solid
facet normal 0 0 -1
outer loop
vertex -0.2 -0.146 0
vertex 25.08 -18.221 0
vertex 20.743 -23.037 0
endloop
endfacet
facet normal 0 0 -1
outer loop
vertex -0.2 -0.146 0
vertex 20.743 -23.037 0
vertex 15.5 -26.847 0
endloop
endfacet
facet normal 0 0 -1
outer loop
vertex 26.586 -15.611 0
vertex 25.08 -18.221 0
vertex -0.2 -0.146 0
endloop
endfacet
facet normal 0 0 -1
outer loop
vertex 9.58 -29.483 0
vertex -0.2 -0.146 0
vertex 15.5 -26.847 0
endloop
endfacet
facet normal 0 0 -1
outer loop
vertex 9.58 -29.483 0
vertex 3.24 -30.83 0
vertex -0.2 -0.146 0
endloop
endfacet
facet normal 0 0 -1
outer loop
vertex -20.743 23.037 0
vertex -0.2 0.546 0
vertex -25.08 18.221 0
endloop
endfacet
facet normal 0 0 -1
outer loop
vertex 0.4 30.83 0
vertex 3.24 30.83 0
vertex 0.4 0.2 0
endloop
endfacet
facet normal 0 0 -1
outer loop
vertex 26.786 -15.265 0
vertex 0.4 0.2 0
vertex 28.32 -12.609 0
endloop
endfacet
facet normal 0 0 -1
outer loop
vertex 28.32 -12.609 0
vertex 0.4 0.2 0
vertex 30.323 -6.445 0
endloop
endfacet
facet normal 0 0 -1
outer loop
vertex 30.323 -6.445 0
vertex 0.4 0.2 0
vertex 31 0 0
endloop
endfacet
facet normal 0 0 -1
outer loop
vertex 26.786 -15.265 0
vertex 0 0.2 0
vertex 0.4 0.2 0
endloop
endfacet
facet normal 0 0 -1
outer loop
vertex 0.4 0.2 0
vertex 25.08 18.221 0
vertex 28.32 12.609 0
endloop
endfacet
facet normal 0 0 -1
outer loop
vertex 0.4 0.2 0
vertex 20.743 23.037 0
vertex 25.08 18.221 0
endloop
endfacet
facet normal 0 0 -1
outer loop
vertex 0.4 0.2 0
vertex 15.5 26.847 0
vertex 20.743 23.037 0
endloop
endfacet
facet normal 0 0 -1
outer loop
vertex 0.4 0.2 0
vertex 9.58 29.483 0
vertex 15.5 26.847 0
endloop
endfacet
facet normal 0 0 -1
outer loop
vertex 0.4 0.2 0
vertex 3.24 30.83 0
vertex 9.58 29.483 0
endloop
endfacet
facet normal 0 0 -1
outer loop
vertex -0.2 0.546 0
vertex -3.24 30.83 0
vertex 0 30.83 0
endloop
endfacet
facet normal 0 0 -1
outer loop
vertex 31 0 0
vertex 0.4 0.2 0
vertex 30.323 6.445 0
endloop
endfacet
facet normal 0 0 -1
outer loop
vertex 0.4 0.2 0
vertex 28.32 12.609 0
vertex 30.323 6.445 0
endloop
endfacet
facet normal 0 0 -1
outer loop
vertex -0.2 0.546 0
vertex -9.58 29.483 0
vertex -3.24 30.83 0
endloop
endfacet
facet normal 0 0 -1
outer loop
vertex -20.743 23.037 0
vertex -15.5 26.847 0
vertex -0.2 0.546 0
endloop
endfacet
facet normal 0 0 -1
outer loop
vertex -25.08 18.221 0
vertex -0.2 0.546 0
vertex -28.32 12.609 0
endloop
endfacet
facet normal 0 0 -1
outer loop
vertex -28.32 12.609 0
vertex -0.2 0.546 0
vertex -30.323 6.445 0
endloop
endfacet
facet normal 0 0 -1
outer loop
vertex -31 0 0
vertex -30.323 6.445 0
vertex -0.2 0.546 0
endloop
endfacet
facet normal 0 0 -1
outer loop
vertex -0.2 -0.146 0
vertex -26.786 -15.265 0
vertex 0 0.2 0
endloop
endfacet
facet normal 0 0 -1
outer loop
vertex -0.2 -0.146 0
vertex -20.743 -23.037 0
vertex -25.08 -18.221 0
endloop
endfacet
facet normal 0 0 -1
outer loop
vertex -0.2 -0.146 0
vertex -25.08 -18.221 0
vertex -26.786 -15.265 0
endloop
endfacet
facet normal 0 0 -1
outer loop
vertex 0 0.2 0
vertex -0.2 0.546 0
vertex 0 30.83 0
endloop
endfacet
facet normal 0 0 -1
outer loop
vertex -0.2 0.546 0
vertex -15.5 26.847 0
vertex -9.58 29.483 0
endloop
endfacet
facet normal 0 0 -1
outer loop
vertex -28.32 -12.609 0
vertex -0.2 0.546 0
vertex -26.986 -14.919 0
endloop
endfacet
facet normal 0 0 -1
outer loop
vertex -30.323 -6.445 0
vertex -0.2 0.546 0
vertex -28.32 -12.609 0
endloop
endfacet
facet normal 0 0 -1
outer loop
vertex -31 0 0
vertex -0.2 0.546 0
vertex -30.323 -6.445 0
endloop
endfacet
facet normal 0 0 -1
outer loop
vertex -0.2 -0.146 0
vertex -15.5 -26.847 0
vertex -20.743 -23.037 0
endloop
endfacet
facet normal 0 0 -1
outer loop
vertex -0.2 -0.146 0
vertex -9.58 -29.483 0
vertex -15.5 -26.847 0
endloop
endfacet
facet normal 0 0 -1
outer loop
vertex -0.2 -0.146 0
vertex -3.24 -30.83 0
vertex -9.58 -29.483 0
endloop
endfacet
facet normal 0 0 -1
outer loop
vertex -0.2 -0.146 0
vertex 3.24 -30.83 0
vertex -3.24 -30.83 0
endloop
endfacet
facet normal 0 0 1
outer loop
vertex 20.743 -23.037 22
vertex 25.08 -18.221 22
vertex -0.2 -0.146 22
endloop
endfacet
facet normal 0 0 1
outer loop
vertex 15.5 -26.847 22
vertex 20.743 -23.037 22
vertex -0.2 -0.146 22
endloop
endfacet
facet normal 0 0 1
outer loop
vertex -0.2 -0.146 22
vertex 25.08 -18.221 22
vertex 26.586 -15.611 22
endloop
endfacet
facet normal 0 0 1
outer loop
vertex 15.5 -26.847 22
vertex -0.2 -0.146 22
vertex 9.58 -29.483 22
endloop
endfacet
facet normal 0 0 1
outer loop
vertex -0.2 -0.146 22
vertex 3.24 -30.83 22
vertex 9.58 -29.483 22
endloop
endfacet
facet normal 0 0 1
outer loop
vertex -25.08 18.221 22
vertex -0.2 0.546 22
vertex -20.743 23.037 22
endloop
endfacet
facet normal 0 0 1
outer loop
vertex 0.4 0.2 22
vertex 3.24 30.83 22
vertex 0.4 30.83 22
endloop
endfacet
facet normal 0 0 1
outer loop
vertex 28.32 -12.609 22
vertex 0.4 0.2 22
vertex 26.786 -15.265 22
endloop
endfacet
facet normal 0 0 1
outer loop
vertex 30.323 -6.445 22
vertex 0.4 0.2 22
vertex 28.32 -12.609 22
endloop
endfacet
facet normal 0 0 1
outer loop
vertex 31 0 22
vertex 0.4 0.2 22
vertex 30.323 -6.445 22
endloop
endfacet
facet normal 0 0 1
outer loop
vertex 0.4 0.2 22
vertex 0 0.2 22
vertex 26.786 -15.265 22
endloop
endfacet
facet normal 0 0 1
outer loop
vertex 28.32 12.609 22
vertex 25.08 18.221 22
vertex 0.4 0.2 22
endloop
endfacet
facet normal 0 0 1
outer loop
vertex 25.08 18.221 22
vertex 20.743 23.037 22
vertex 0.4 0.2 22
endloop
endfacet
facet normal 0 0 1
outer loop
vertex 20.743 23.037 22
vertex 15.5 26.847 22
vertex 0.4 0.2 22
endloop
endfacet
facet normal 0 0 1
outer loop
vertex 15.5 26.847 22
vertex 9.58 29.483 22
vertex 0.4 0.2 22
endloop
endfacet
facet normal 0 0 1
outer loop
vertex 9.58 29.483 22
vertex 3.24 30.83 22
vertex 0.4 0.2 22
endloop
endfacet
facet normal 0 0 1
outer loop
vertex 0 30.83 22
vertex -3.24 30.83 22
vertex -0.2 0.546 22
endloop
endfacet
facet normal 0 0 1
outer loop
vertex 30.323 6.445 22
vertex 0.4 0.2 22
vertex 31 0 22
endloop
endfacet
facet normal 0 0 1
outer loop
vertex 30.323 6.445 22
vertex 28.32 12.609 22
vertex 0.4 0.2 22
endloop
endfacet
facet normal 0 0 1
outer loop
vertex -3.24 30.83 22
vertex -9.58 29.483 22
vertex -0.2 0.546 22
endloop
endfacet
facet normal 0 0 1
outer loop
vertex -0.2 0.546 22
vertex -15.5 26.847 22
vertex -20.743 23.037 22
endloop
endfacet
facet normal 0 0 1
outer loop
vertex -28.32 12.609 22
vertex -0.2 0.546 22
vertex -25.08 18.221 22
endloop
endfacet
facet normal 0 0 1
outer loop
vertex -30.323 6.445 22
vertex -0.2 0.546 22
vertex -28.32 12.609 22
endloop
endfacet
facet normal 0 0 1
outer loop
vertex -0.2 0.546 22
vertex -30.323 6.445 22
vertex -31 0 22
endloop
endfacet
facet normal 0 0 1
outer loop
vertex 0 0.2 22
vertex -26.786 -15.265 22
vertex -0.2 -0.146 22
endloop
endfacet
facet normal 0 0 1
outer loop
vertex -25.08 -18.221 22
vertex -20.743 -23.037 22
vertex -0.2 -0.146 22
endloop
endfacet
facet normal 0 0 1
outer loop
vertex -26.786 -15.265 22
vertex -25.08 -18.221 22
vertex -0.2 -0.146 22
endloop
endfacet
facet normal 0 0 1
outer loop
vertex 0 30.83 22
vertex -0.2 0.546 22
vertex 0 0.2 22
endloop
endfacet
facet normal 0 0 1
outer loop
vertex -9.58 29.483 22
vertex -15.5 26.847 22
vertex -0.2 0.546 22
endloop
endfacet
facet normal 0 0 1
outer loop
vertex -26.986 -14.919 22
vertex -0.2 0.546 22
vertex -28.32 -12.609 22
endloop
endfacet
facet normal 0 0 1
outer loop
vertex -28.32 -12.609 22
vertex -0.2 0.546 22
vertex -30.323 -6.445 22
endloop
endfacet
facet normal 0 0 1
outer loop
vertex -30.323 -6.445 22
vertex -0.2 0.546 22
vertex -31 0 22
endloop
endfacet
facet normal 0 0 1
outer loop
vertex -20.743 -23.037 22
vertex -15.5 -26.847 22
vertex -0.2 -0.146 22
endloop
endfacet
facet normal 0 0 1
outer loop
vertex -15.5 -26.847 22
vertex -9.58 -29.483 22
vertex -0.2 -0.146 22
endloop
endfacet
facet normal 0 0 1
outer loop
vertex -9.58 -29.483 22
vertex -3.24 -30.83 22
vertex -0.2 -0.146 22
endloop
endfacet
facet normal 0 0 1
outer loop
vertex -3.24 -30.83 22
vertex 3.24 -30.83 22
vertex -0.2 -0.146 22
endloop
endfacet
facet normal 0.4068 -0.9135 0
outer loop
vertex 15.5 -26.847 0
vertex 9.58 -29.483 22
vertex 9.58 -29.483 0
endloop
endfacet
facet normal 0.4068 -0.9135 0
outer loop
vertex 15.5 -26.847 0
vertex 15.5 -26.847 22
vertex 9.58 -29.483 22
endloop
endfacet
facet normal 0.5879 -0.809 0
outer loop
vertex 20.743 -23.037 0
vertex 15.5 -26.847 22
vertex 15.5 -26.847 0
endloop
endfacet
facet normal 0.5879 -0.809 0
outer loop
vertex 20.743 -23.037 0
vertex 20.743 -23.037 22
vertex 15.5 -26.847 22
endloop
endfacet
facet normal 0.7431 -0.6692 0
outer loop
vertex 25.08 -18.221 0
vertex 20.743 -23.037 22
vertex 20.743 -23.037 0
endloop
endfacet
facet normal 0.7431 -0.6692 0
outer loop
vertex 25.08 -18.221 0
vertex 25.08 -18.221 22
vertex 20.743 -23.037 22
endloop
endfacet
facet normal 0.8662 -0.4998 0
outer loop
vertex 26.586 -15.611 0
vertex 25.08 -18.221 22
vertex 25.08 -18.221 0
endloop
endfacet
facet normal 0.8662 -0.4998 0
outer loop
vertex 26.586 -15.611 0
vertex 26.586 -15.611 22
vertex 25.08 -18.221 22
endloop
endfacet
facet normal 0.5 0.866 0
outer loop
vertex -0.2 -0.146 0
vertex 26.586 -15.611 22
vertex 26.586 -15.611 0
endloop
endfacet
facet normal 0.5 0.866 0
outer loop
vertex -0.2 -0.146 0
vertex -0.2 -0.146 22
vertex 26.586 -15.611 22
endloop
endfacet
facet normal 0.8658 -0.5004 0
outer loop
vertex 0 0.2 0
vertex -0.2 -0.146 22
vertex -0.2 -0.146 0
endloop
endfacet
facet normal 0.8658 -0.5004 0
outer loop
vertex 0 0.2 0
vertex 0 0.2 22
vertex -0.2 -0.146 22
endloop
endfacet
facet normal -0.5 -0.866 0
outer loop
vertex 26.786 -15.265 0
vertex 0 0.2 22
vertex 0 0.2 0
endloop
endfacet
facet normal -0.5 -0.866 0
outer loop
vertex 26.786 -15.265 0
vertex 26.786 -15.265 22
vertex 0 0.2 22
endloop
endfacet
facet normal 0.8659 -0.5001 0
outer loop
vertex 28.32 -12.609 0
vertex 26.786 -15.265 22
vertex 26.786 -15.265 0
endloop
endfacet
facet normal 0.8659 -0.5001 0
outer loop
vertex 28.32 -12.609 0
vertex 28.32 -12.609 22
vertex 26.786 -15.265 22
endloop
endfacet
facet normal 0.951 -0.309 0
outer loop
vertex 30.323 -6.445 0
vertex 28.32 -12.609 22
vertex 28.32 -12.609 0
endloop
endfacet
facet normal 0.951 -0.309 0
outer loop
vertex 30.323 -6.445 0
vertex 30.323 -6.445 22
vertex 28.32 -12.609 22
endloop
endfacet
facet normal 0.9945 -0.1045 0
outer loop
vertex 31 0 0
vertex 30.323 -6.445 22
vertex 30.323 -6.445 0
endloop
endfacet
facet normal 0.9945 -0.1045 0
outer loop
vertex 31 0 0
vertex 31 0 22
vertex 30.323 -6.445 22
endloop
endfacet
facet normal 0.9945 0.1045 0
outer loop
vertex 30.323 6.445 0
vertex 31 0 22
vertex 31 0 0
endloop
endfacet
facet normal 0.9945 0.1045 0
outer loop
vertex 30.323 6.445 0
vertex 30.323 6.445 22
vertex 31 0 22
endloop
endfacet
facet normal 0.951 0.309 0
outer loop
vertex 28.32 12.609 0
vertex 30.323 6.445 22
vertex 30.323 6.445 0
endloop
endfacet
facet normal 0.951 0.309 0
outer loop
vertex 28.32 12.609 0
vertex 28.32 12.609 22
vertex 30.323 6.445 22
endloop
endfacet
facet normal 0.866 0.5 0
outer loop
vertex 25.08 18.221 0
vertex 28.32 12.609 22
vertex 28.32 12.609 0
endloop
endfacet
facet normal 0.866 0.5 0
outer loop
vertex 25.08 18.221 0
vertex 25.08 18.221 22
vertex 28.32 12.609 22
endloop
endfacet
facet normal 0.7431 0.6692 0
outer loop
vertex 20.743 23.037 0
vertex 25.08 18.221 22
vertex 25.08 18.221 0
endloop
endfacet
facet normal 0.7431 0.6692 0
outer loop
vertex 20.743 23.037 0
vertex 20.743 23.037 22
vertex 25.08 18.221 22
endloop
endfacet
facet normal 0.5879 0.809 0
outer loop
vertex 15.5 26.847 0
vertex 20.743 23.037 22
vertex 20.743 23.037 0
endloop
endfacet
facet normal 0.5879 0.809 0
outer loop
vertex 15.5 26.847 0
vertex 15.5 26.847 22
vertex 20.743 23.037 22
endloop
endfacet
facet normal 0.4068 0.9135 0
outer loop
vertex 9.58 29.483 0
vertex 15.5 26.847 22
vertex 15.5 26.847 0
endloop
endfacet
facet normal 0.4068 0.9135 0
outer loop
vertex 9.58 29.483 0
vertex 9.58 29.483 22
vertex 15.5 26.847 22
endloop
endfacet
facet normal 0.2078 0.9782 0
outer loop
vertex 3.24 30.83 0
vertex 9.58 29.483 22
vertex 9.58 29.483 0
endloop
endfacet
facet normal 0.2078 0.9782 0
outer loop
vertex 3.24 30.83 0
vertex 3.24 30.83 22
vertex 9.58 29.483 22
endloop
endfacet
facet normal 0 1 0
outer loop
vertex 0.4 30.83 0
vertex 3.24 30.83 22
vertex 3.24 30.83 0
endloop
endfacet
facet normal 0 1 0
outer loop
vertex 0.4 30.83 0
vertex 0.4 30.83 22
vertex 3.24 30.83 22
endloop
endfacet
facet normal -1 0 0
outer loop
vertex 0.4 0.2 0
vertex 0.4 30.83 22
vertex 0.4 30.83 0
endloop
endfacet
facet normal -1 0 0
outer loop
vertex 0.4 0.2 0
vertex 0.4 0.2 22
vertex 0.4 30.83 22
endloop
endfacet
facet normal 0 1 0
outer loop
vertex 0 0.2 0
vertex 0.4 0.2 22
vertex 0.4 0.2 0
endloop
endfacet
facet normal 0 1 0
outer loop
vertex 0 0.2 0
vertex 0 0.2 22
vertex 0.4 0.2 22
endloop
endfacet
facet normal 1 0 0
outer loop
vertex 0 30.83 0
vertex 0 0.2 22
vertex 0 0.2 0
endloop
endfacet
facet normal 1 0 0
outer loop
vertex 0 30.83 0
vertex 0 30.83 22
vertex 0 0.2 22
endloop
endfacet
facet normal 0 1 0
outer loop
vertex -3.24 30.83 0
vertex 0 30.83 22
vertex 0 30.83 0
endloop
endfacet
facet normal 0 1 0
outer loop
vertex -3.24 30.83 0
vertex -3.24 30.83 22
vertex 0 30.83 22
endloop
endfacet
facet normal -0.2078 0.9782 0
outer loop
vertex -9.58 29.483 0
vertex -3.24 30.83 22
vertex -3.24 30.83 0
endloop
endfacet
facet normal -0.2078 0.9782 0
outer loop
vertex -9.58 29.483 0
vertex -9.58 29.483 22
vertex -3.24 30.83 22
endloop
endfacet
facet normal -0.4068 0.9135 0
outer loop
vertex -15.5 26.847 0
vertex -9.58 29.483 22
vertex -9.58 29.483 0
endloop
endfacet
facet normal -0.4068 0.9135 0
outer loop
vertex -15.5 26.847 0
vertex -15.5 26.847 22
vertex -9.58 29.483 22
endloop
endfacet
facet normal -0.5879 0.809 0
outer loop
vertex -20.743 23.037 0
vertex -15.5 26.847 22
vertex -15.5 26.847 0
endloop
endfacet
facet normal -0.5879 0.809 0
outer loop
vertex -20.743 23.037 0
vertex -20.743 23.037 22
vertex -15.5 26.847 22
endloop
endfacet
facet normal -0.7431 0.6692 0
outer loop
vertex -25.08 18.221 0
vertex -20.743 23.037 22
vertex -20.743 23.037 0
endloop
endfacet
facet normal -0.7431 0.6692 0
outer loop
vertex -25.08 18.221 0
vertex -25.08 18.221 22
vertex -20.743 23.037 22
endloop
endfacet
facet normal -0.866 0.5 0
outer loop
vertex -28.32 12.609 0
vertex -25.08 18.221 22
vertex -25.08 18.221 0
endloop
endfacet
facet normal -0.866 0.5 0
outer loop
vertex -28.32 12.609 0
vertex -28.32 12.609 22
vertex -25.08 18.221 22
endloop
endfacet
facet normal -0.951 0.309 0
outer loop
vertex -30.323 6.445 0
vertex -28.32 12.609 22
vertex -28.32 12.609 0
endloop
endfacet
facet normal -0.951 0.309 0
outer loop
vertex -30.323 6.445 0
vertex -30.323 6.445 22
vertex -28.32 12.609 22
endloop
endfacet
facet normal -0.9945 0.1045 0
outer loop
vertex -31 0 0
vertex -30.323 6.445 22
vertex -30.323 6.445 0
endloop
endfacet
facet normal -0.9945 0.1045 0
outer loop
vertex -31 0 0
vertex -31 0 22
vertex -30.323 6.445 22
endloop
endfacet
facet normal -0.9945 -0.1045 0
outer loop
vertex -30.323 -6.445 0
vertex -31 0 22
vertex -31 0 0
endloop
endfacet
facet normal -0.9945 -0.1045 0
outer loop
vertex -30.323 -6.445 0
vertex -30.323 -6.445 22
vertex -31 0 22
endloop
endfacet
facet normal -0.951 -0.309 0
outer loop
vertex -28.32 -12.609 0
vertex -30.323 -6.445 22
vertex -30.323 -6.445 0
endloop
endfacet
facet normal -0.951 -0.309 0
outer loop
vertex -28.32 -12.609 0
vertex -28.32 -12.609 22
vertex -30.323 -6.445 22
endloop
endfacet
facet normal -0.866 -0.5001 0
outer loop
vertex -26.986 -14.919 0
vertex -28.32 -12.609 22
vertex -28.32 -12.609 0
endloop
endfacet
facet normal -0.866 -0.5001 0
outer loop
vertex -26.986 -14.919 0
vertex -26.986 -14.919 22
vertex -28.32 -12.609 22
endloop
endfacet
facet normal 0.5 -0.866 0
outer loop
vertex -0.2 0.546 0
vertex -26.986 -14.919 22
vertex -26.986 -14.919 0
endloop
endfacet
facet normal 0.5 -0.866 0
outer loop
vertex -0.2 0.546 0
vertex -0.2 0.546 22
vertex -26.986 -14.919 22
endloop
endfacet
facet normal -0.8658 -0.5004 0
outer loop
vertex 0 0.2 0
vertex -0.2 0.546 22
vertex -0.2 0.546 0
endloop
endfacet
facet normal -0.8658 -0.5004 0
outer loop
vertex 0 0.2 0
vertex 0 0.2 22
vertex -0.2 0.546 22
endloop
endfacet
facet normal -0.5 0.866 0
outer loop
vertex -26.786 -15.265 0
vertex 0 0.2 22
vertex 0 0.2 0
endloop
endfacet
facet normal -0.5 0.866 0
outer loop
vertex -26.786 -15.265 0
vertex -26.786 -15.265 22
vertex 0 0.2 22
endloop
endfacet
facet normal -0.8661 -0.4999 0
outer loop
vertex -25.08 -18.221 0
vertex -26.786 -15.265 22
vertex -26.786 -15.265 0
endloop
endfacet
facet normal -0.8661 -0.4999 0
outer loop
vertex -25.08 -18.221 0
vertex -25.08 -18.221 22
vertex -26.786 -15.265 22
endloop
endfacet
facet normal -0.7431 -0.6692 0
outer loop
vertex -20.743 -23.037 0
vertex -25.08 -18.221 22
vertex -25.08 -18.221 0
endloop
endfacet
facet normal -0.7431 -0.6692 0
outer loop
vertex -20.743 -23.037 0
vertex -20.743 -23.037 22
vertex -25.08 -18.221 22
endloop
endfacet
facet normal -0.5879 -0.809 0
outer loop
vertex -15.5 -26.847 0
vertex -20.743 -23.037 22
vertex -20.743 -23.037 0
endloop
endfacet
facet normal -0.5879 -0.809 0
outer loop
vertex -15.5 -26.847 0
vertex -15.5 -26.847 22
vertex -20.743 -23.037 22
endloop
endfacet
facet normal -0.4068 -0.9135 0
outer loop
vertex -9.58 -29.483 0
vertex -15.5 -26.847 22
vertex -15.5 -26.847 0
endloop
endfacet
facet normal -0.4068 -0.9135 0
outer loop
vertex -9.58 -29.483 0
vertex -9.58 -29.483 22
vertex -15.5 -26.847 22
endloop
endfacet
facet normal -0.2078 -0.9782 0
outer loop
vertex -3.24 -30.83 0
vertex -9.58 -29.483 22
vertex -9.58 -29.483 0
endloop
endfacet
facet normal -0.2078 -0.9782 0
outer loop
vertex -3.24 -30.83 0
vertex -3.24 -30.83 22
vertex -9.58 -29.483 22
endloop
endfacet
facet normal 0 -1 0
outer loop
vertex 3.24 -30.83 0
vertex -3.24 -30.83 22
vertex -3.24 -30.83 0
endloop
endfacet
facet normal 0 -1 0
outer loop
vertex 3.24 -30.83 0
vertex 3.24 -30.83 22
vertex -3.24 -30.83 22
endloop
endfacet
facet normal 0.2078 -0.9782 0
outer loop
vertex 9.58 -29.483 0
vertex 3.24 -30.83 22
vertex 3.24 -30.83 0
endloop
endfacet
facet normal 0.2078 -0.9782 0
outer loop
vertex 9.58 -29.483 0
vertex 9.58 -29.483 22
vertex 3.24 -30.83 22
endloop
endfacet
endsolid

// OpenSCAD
//Konfiguration
//Radius
    r = 31;
//Höhe des Kuchens
    h = 22;
//Anzahl der Stücke (gerade Zahl)
    n = 3;
    
module Schnitt (b = 0.4, l = r+2)
    translate([0, b/2, 0])
    for (i = [0:n-1]) {
        rotate(i*360/n)
        square([b, l], false);
    }

module Kuchen ()
    linear_extrude(height = h)
    difference(){
        circle(r, true);
        Schnitt();   
}

Kuchen ();
